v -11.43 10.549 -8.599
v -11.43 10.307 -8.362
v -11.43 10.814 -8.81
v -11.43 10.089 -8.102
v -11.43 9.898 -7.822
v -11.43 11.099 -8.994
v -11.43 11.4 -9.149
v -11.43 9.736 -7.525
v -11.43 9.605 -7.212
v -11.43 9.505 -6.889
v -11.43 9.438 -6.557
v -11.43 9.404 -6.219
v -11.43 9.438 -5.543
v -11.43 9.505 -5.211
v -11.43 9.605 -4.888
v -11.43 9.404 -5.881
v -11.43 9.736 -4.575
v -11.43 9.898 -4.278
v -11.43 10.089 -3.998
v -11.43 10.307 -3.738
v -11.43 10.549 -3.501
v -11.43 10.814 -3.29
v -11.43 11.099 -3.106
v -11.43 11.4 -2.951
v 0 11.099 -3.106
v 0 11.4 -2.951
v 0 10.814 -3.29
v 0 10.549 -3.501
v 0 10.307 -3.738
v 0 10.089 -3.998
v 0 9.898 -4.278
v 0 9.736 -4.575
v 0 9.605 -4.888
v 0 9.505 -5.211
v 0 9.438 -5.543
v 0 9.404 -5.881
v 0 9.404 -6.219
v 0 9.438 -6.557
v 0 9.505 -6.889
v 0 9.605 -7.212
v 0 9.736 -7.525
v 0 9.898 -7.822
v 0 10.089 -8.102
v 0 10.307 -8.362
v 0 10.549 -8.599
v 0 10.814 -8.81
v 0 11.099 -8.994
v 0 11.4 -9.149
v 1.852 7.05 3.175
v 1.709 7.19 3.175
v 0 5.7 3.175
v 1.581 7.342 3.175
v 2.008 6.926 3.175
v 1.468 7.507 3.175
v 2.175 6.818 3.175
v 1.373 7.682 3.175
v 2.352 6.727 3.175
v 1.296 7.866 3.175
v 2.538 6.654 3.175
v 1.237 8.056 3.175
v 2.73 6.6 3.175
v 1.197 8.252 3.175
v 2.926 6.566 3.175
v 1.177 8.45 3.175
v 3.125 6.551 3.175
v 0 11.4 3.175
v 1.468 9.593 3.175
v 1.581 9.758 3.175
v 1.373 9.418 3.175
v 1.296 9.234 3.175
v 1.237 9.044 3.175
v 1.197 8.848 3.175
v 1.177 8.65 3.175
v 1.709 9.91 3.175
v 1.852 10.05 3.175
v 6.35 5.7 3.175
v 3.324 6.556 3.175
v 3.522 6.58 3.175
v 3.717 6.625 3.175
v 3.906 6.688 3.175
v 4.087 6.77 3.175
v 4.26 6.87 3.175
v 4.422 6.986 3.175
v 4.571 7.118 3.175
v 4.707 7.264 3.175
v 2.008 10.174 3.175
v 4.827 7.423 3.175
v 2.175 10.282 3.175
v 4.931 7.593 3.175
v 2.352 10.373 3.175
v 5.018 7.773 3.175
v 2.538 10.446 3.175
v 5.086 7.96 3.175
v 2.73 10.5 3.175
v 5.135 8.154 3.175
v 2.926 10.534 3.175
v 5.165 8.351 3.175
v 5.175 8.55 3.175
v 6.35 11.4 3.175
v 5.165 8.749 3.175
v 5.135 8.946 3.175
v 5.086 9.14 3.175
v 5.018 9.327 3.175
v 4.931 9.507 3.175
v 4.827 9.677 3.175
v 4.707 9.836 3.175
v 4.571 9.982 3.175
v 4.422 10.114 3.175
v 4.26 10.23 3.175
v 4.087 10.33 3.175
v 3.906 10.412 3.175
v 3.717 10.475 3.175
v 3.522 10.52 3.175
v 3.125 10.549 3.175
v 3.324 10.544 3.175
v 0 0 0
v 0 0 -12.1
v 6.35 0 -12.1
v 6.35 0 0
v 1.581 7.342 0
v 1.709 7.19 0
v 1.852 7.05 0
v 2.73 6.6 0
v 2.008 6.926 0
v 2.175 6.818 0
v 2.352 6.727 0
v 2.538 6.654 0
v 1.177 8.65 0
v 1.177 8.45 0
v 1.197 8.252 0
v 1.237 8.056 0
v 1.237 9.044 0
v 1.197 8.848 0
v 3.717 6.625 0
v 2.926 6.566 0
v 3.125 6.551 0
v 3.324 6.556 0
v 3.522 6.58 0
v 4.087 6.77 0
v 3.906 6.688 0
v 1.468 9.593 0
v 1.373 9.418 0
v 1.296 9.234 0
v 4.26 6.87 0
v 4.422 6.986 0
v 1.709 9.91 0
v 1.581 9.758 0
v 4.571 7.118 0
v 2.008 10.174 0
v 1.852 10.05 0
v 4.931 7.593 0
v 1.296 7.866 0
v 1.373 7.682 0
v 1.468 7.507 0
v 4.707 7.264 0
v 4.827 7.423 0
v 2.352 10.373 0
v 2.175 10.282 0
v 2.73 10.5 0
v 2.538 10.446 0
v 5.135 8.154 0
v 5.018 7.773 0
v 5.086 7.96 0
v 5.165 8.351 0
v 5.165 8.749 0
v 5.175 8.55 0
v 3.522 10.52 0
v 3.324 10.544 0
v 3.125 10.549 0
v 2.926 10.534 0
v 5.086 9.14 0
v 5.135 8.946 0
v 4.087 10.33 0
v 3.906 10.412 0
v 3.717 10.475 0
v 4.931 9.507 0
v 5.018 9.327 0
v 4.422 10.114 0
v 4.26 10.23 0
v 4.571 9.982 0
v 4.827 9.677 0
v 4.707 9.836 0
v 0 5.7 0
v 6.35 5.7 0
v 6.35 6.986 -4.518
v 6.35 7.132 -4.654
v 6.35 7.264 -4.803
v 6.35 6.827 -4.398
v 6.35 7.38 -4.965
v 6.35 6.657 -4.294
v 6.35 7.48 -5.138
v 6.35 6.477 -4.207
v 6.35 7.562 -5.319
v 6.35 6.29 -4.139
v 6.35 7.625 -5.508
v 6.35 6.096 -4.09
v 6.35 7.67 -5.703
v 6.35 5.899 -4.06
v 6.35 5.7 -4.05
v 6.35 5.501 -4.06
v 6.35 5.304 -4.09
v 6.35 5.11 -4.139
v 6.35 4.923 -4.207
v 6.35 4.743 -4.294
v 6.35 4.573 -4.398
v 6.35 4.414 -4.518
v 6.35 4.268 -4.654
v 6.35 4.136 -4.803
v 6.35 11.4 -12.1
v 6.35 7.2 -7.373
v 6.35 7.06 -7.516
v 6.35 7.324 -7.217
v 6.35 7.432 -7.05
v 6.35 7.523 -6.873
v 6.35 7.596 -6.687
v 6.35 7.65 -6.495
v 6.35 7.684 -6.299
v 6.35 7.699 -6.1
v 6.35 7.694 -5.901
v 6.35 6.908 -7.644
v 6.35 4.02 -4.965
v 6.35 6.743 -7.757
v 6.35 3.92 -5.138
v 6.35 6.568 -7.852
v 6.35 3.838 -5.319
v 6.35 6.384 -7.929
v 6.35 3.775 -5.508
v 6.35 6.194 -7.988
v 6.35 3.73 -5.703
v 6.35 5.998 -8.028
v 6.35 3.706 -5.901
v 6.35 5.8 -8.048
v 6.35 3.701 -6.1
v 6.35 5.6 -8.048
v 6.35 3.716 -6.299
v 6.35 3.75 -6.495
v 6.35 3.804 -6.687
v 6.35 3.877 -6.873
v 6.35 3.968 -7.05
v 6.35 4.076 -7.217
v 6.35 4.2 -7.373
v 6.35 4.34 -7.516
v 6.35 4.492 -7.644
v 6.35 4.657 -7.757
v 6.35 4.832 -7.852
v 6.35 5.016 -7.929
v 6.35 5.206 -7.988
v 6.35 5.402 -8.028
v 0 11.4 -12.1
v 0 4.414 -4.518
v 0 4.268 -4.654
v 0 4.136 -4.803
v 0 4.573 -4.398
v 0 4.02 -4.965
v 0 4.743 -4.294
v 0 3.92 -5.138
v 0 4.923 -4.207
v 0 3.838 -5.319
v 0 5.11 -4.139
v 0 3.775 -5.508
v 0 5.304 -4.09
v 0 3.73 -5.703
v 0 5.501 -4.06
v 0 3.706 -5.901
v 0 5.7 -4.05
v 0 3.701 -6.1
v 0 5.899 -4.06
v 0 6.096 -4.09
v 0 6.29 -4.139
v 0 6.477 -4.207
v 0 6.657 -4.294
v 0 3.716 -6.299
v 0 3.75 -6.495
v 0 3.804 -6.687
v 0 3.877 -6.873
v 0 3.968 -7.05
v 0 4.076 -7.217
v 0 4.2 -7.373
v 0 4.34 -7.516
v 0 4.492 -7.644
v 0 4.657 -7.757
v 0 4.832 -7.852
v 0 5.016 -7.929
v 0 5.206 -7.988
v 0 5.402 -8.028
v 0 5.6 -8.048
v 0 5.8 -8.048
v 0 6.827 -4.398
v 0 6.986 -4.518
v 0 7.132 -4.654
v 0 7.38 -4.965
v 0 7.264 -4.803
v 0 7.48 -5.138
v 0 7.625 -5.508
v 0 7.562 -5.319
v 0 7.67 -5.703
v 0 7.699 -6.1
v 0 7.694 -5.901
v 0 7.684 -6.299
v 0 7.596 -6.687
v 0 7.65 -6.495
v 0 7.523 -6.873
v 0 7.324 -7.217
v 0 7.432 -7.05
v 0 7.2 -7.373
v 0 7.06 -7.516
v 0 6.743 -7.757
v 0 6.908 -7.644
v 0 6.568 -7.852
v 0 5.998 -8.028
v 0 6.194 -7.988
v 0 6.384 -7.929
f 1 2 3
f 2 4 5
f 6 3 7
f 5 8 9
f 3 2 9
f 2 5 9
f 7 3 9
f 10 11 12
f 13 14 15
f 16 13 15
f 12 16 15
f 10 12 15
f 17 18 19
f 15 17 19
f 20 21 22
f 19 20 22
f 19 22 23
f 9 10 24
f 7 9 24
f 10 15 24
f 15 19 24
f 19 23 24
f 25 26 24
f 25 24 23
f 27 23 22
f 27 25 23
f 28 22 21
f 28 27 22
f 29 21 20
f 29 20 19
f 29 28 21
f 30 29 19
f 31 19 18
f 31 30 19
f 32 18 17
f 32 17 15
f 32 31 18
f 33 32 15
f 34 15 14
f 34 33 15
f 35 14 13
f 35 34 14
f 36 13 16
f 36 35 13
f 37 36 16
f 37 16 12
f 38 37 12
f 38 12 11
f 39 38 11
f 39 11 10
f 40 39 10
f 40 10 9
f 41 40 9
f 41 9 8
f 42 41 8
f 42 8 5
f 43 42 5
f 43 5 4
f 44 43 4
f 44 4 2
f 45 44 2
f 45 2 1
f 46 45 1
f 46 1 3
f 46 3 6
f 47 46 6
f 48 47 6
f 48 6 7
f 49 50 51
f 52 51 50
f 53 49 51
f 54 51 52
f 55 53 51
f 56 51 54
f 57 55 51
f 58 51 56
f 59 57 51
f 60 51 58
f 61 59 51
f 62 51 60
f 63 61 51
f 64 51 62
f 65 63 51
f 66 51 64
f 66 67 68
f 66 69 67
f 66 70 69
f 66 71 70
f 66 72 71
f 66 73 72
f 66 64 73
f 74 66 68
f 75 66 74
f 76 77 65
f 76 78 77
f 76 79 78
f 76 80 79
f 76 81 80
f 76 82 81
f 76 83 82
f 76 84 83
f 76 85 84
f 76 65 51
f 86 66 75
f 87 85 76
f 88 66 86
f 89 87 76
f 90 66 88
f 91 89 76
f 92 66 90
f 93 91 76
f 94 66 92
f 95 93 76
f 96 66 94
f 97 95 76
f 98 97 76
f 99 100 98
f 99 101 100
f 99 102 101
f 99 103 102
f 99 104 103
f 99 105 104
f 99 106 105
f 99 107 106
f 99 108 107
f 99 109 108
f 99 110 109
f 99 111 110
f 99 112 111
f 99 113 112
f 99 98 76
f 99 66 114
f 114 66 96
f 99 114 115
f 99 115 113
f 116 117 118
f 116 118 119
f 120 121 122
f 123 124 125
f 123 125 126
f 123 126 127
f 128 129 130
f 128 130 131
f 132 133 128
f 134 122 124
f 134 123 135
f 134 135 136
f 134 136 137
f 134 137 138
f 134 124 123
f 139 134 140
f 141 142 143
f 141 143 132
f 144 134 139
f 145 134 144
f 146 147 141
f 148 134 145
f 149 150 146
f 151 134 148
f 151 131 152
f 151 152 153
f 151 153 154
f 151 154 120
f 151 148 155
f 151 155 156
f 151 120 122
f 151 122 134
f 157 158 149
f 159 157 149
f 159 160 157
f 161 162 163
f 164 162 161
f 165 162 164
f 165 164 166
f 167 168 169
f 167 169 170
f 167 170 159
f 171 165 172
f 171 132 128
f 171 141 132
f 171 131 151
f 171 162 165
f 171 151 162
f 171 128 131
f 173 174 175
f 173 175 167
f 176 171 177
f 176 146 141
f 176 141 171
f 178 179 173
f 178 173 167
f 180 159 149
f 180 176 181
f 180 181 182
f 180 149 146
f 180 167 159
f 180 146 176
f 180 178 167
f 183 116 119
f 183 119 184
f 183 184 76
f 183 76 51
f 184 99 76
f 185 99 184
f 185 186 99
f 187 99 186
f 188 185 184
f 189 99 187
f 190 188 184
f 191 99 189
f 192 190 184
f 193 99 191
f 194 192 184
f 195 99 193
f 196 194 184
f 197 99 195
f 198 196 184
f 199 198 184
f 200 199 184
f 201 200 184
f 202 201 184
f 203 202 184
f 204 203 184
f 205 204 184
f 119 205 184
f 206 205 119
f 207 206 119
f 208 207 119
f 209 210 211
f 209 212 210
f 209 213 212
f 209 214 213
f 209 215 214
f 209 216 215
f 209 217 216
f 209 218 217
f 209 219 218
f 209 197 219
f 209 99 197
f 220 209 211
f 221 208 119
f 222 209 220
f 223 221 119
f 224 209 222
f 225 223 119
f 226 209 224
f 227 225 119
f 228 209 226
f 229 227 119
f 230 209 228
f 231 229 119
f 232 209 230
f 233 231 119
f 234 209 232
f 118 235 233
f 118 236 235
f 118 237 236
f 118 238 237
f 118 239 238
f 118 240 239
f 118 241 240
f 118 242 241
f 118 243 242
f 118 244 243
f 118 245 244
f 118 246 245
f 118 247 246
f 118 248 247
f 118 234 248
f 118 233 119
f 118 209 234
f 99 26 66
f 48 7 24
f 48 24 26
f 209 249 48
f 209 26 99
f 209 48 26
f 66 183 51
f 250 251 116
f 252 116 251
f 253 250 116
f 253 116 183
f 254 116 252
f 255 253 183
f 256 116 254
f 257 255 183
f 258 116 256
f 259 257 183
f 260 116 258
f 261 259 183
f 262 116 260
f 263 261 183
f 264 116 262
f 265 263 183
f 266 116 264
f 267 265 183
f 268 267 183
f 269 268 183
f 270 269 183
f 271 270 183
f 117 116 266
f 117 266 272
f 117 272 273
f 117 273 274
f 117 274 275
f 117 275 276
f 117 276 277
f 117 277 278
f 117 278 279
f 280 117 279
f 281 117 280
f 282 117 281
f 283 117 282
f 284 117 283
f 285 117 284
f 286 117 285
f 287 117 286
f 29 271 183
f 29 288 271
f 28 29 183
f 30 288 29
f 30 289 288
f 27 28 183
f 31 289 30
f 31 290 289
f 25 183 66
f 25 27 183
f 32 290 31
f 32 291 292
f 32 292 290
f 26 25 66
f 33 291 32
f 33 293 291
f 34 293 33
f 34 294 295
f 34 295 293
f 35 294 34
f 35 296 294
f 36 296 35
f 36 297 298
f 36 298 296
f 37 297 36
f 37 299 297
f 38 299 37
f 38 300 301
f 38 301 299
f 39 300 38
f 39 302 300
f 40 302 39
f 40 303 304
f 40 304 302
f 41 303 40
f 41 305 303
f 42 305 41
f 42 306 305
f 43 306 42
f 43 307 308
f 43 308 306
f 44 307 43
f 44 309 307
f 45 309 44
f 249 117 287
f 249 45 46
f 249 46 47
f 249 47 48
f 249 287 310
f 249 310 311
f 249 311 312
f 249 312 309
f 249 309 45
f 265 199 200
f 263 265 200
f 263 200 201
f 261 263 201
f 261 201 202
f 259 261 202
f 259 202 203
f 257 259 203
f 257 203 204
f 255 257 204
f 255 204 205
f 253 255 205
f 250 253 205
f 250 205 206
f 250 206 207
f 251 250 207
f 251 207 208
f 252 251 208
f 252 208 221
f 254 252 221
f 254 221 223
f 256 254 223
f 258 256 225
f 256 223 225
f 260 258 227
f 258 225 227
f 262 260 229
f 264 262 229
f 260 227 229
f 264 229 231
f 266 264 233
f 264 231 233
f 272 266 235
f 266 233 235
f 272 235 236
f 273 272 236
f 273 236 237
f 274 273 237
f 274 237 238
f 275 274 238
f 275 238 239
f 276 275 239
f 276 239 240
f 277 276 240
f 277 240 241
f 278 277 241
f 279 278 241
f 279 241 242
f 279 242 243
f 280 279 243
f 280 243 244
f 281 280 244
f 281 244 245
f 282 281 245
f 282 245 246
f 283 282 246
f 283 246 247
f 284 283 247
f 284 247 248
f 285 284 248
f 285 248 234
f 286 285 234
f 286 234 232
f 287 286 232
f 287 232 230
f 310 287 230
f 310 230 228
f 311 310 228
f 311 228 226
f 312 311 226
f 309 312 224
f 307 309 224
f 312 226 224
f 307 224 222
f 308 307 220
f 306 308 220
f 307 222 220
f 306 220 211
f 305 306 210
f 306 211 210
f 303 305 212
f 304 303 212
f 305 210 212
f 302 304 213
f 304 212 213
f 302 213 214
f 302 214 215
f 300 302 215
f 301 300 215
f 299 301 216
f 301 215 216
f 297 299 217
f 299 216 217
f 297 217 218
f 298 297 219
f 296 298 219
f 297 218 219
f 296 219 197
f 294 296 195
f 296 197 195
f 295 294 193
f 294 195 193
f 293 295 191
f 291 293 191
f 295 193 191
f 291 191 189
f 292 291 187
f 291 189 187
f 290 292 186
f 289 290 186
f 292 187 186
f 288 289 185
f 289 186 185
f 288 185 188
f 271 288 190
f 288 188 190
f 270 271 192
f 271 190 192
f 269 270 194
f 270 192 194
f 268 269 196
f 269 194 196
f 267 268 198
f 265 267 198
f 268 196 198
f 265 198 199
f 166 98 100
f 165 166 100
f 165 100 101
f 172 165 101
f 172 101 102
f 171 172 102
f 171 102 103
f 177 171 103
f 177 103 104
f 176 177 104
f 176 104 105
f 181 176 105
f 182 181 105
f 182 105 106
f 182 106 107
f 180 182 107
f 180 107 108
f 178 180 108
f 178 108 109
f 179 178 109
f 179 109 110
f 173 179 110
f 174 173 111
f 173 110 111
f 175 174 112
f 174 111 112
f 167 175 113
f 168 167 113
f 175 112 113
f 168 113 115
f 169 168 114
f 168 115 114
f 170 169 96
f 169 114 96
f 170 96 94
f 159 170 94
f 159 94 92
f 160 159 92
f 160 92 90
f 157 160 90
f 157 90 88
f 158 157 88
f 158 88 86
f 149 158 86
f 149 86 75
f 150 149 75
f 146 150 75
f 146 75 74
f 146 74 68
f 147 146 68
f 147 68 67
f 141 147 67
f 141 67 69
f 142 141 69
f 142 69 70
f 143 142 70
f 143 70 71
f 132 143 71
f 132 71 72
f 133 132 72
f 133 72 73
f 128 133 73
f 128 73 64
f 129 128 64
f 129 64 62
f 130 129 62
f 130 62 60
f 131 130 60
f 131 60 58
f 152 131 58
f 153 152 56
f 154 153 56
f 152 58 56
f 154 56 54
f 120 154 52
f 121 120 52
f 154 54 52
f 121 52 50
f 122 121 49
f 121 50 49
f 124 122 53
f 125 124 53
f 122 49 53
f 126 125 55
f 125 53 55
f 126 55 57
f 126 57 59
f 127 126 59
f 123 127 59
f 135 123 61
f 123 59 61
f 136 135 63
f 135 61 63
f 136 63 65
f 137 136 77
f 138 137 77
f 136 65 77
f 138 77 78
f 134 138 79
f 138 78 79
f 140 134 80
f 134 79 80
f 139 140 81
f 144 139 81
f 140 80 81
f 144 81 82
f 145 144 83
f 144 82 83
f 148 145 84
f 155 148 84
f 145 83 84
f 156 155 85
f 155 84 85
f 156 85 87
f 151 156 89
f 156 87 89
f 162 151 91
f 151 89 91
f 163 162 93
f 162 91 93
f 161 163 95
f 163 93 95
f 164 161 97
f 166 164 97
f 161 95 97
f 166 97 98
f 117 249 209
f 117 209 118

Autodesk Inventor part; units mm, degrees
ref_plane "YZ Plane" through (0, 0, 0) normal (1, 0, 0) x (0, 1, 0)
ref_plane "XZ Plane" through (0, 0, 0) normal (0, 1, 0) x (-1, 0, 0)
ref_plane "XY Plane" through (0, 0, 0) normal (0, 0, 1) x (1, 0, 0)
sketch "Sketch1" plane through (0, 0, 0) normal (1, 0, 0) x (0, 1, 0)
  line L0 (0, 0) -> (11.4, 0)
  line L1 (11.4, 0) -> (11.4, -12.1)
  line L2 (11.4, -12.1) -> (0, -12.1)
  line L3 (0, -12.1) -> (0, 0)
  arc A0 (11.4, -2.9512) -> (11.4, -9.1488) centre (12.8006, -6.05) ccw
  point P0 (3.5, -5)
  dimension "d0" = 11.4
  dimension "d1" = 12.1
  dimension "d2" = 6.1976
  dimension "d3" = 2.9512
  dimension "d29" = 2
extrude "Extrusion1" add sketch "Sketch1" along normal blind 6.35
extrude "Extrusion2" add sketch "Sketch1" against normal blind 11.43 contours L1 A0
sketch "Sketch3" plane through (0, 0, 0) normal (-1, 0, 0) x (0, 0, 1)
  line L0 (0, 11.4) -> (0, 0) projected
  line L1 (0, 0) -> (-12.1, 0) projected
  point P0 (-6.05, 5.7)
  dimension "d19" = 12.1
  dimension "d20" = 6.05
  dimension "d30" = 11.4
  dimension "d31" = 5.7
sketch "Sketch6" plane through (0, 0, 0) normal (0, 0, 1) x (1, 0, 0)
  line L0 (6.35, 5.7) -> (0, 5.7)
  line L1 (0, 0) -> (0, 11.4) projected
  line L2 (6.35, 11.4) -> (6.35, 0) projected
  line L3 (0, 0) -> (6.35, 0) projected
  line L4 (0, 11.4) -> (6.35, 11.4) projected
  dimension "d33" = 11.4
  dimension "d46" = 5.7
hole "Hole2" at (0, 5.7, -6.05) direction (1, 0, 0) diameter 4 end through all
extrude "Extrusion8" add sketch "Sketch6" along normal blind 3.175 contours L0 L1 L4 L2
sketch "Sketch7" plane through (0, 0, 3.175) normal (0, 0, 1) x (1, 0, 0)
  line L0 (6.35, 11.4) -> (0, 11.4) projected
  line L1 (6.35, 5.7) -> (6.35, 11.4) projected
  point P0 (0, 0)
  point P1 (3.175, 8.55)
  dimension "d50" = 6.35
  dimension "d51" = 5.7
  dimension "d52" = 2.85
  dimension "d53" = 3.175
sketch "Sketch8" plane through (0, 0, 3.175) normal (0, 0, 1) x (1, 0, 0)
  circle A0 centre (3.175, 8.55) radius 2
  line L0 (6.35, 11.4) -> (0, 11.4) projected
  line L1 (6.35, 5.7) -> (6.35, 11.4) projected
  point P0 (0, 0)
  dimension "d63" = 2.85
  dimension "d64" = 3.175
  dimension "d65" = 4
extrude "Extrusion9" cut sketch "Sketch8" against normal up to surface (3.175 mm away)
thread "Thread2" size "M4x0.7" class "6H" standard "ISO Metric profile" full length
equation "\"d3\" = -0.5 * d2 + 0.5 * d1"
equation "\"d20\" = 0.5 * d19"
equation "\"d31\" = 0.5 * d30"
equation "\"d46\" = 0.5 * d33"
equation "\"d52\" = 0.5 * d51"
equation "\"d53\" = 0.5 * d50"
equation "\"d63\" = d52"
equation "\"d64\" = d53"
properties part number "end peice for slides"
